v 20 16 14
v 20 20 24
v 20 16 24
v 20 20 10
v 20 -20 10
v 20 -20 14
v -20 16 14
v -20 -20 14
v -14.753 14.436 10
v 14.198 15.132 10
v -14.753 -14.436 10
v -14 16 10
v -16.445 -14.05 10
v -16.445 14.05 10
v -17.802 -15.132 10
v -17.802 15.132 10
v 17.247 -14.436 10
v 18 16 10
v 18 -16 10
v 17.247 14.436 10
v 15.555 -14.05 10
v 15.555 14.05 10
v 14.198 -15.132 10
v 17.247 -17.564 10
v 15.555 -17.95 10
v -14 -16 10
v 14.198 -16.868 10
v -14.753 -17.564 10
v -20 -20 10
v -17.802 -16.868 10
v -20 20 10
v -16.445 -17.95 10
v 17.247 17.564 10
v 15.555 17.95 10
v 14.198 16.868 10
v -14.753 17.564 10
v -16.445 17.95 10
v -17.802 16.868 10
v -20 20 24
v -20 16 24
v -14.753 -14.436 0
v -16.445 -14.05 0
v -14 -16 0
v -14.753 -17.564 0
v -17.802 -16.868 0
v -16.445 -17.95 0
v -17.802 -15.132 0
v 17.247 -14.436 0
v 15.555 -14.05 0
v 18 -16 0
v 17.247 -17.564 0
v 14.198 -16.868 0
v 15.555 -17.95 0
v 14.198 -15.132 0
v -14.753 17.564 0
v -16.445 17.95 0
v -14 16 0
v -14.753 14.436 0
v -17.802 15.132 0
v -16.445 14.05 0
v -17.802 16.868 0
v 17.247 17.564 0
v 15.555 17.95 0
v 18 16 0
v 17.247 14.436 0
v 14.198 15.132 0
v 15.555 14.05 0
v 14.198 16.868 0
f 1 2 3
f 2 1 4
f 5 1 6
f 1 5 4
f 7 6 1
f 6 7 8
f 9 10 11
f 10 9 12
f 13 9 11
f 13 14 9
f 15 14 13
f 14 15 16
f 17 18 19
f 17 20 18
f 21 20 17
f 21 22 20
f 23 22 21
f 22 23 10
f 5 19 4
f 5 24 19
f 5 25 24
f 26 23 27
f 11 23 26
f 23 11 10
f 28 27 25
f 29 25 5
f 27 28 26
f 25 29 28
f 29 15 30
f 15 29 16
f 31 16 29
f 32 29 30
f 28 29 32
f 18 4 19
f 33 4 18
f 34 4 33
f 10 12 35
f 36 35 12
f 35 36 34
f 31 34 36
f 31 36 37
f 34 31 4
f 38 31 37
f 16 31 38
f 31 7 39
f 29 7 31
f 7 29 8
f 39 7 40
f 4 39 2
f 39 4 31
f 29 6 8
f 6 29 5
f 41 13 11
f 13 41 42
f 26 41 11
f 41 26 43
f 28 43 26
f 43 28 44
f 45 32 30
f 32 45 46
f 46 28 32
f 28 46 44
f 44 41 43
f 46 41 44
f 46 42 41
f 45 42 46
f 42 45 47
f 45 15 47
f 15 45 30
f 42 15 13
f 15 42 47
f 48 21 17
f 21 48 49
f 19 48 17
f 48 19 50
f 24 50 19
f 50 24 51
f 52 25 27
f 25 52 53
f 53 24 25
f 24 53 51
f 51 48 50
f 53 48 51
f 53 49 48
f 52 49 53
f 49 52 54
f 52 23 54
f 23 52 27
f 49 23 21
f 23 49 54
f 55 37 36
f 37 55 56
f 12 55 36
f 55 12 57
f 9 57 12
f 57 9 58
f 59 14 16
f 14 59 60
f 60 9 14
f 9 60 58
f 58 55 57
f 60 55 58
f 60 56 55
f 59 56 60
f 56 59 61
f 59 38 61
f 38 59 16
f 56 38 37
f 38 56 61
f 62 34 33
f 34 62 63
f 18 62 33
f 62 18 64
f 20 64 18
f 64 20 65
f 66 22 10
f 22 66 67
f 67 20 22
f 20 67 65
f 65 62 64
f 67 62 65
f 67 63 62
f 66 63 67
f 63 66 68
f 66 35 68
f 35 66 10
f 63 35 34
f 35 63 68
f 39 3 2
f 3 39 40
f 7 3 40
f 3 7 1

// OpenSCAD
union() {
  translate([0,0,12]) cube([40,40,4], center=true);
  translate([-16,-16,0]) cylinder(h=12, r=2);
  translate([16,-16,0]) cylinder(h=12, r=2);
  translate([-16,16,0]) cylinder(h=12, r=2);
  translate([16,16,0]) cylinder(h=12, r=2);
  translate([0,18,18]) cube([40,4,12], center=true);
}
